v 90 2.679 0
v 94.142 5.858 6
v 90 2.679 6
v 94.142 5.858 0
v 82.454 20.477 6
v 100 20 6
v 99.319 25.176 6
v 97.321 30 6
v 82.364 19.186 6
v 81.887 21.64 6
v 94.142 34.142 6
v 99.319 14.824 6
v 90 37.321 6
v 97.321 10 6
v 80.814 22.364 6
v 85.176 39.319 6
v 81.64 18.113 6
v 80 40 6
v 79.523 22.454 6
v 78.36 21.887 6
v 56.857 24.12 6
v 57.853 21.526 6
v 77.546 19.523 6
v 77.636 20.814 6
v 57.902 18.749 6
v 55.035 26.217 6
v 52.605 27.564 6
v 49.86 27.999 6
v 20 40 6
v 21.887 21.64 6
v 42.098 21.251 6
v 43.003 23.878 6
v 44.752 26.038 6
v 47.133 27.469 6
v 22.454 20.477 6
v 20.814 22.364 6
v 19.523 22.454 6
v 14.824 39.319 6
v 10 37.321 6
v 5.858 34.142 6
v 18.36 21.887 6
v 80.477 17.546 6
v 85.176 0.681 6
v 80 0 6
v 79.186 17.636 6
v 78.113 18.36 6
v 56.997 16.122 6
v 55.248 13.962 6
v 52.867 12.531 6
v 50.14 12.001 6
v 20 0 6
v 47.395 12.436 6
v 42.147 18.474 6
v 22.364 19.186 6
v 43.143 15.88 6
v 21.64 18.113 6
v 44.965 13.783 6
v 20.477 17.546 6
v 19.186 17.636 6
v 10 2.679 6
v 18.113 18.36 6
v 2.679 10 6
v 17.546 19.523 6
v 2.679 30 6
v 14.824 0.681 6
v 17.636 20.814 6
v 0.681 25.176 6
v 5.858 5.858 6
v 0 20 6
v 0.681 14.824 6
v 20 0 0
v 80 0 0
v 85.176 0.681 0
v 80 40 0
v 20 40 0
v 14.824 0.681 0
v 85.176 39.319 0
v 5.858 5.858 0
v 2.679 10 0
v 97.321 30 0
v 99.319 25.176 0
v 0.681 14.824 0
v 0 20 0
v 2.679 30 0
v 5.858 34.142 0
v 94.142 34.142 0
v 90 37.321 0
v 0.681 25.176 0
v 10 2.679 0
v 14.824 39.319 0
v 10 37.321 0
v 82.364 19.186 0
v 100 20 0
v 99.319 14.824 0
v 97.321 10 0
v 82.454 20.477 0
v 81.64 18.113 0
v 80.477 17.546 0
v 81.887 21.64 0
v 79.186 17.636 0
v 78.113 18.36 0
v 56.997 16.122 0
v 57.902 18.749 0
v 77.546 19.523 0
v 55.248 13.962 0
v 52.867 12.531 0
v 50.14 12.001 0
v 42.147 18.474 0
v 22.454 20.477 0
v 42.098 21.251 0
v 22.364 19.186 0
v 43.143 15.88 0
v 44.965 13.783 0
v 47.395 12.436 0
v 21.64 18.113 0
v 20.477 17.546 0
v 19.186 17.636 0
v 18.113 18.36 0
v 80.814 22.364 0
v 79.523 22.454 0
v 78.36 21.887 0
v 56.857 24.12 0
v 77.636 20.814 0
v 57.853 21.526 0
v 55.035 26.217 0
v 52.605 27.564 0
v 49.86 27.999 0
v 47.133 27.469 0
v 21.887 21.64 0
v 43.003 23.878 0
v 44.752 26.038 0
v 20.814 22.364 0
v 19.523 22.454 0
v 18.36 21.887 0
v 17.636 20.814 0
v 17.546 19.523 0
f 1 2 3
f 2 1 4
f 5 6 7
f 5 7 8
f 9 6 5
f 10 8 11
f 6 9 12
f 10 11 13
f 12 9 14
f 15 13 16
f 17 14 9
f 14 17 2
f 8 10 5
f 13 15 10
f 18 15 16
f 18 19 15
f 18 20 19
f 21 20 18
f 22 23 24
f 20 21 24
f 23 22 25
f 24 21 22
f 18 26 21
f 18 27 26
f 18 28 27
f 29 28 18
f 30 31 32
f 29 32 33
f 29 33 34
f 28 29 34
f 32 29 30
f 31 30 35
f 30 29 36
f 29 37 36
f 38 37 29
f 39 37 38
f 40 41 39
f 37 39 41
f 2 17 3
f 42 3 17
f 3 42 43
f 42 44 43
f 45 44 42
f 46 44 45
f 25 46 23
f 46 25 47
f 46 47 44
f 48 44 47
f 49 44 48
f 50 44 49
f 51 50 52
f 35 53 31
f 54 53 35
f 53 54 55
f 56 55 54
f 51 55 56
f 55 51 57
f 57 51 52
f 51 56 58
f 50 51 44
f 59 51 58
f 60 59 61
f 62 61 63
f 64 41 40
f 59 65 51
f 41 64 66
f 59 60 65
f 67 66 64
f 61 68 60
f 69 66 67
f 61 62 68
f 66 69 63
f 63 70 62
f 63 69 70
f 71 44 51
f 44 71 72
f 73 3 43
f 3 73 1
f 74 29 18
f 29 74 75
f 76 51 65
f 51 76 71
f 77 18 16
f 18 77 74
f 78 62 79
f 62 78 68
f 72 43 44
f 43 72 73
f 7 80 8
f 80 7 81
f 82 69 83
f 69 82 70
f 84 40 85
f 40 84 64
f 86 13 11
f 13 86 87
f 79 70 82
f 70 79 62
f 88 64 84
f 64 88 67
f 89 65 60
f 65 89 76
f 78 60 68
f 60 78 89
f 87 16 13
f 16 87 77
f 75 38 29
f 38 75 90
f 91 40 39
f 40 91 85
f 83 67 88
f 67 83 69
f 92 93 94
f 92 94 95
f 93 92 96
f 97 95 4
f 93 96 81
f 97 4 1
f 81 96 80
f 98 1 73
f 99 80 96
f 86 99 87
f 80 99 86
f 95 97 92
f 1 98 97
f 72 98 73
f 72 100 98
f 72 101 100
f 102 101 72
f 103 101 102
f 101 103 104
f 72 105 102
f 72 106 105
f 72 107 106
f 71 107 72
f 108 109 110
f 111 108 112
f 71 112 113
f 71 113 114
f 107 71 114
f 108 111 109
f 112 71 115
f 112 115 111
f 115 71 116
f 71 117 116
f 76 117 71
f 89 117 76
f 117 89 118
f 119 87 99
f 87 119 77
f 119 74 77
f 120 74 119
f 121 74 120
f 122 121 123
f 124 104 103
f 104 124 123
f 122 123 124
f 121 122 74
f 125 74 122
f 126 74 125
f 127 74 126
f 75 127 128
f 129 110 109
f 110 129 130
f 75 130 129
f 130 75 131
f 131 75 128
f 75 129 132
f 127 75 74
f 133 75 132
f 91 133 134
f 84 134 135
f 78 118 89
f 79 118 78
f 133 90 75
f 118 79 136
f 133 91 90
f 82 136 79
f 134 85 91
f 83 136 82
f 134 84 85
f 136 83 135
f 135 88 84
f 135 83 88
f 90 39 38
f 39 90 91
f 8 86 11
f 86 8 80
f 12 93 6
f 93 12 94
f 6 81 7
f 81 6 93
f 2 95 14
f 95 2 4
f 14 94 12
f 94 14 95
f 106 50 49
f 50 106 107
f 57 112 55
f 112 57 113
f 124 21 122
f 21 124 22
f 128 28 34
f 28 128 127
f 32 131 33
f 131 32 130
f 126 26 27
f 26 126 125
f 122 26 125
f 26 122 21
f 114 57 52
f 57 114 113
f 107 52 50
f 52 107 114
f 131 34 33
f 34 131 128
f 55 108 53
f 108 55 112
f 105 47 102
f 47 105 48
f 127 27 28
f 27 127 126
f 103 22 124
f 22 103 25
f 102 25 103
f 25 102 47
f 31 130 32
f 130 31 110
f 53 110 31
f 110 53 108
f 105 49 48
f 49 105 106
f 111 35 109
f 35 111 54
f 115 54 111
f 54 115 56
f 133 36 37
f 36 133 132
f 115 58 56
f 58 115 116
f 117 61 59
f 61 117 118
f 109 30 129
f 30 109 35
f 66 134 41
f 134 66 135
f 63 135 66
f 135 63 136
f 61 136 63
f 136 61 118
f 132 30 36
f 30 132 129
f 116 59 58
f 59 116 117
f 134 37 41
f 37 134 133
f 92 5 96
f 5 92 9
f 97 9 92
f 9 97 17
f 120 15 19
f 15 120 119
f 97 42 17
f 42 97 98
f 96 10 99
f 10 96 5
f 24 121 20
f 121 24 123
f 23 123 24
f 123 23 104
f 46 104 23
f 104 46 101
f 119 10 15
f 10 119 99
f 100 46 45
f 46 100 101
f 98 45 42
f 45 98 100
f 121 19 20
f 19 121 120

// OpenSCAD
$fn = 32;

// ----------------------------------------------------------------------
// Spacer plate: obround span 60, caps R20
// ----------------------------------------------------------------------

// --- parameters (mm) ---
bore_r = 8;               // centre bore radius
bolt_r = 2.5;             // bolt hole radius
plate_t = 6;              // plate thickness, Z (extrusion height)
span = 60;                // obround span
cap_r = 20;               // cap radius

profile = [[20, 40], [14.824, 39.319], [10, 37.321], [5.858, 34.142], [2.679, 30], [0.681, 25.176], [0, 20], [0.681, 14.824], [2.679, 10], [5.858, 5.858], [10, 2.679], [14.824, 0.681], [20, 0], [80, 0], [85.176, 0.681], [90, 2.679], [94.142, 5.858], [97.321, 10], [99.319, 14.824], [100, 20], [99.319, 25.176], [97.321, 30], [94.142, 34.142], [90, 37.321], [85.176, 39.319], [80, 40]];  // primary outline, 26 points, counter clockwise
void_1 = [[57.853, 21.526], [56.857, 24.12], [55.035, 26.217], [52.605, 27.564], [49.86, 27.999], [47.133, 27.469], [44.752, 26.038], [43.003, 23.878], [42.098, 21.251], [42.147, 18.474], [43.143, 15.88], [44.965, 13.783], [47.395, 12.436], [50.14, 12.001], [52.867, 12.531], [55.248, 13.962], [56.997, 16.122], [57.902, 18.749]];  // centre bore, 18 points
void_2 = [[22.454, 20.477], [21.887, 21.64], [20.814, 22.364], [19.523, 22.454], [18.36, 21.887], [17.636, 20.814], [17.546, 19.523], [18.113, 18.36], [19.186, 17.636], [20.477, 17.546], [21.64, 18.113], [22.364, 19.186]];  // end hole, 12 points
void_3 = [[82.454, 20.477], [81.887, 21.64], [80.814, 22.364], [79.523, 22.454], [78.36, 21.887], [77.636, 20.814], [77.546, 19.523], [78.113, 18.36], [79.186, 17.636], [80.477, 17.546], [81.64, 18.113], [82.364, 19.186]];  // end hole, 12 points

// --- the one profile operation ---
difference() {
  linear_extrude(height = plate_t) polygon(points = profile);
  translate([0, 0, -1])
    linear_extrude(height = plate_t + 2) polygon(points = void_1);
  translate([0, 0, -1])
    linear_extrude(height = plate_t + 2) polygon(points = void_2);
  translate([0, 0, -1])
    linear_extrude(height = plate_t + 2) polygon(points = void_3);
}
